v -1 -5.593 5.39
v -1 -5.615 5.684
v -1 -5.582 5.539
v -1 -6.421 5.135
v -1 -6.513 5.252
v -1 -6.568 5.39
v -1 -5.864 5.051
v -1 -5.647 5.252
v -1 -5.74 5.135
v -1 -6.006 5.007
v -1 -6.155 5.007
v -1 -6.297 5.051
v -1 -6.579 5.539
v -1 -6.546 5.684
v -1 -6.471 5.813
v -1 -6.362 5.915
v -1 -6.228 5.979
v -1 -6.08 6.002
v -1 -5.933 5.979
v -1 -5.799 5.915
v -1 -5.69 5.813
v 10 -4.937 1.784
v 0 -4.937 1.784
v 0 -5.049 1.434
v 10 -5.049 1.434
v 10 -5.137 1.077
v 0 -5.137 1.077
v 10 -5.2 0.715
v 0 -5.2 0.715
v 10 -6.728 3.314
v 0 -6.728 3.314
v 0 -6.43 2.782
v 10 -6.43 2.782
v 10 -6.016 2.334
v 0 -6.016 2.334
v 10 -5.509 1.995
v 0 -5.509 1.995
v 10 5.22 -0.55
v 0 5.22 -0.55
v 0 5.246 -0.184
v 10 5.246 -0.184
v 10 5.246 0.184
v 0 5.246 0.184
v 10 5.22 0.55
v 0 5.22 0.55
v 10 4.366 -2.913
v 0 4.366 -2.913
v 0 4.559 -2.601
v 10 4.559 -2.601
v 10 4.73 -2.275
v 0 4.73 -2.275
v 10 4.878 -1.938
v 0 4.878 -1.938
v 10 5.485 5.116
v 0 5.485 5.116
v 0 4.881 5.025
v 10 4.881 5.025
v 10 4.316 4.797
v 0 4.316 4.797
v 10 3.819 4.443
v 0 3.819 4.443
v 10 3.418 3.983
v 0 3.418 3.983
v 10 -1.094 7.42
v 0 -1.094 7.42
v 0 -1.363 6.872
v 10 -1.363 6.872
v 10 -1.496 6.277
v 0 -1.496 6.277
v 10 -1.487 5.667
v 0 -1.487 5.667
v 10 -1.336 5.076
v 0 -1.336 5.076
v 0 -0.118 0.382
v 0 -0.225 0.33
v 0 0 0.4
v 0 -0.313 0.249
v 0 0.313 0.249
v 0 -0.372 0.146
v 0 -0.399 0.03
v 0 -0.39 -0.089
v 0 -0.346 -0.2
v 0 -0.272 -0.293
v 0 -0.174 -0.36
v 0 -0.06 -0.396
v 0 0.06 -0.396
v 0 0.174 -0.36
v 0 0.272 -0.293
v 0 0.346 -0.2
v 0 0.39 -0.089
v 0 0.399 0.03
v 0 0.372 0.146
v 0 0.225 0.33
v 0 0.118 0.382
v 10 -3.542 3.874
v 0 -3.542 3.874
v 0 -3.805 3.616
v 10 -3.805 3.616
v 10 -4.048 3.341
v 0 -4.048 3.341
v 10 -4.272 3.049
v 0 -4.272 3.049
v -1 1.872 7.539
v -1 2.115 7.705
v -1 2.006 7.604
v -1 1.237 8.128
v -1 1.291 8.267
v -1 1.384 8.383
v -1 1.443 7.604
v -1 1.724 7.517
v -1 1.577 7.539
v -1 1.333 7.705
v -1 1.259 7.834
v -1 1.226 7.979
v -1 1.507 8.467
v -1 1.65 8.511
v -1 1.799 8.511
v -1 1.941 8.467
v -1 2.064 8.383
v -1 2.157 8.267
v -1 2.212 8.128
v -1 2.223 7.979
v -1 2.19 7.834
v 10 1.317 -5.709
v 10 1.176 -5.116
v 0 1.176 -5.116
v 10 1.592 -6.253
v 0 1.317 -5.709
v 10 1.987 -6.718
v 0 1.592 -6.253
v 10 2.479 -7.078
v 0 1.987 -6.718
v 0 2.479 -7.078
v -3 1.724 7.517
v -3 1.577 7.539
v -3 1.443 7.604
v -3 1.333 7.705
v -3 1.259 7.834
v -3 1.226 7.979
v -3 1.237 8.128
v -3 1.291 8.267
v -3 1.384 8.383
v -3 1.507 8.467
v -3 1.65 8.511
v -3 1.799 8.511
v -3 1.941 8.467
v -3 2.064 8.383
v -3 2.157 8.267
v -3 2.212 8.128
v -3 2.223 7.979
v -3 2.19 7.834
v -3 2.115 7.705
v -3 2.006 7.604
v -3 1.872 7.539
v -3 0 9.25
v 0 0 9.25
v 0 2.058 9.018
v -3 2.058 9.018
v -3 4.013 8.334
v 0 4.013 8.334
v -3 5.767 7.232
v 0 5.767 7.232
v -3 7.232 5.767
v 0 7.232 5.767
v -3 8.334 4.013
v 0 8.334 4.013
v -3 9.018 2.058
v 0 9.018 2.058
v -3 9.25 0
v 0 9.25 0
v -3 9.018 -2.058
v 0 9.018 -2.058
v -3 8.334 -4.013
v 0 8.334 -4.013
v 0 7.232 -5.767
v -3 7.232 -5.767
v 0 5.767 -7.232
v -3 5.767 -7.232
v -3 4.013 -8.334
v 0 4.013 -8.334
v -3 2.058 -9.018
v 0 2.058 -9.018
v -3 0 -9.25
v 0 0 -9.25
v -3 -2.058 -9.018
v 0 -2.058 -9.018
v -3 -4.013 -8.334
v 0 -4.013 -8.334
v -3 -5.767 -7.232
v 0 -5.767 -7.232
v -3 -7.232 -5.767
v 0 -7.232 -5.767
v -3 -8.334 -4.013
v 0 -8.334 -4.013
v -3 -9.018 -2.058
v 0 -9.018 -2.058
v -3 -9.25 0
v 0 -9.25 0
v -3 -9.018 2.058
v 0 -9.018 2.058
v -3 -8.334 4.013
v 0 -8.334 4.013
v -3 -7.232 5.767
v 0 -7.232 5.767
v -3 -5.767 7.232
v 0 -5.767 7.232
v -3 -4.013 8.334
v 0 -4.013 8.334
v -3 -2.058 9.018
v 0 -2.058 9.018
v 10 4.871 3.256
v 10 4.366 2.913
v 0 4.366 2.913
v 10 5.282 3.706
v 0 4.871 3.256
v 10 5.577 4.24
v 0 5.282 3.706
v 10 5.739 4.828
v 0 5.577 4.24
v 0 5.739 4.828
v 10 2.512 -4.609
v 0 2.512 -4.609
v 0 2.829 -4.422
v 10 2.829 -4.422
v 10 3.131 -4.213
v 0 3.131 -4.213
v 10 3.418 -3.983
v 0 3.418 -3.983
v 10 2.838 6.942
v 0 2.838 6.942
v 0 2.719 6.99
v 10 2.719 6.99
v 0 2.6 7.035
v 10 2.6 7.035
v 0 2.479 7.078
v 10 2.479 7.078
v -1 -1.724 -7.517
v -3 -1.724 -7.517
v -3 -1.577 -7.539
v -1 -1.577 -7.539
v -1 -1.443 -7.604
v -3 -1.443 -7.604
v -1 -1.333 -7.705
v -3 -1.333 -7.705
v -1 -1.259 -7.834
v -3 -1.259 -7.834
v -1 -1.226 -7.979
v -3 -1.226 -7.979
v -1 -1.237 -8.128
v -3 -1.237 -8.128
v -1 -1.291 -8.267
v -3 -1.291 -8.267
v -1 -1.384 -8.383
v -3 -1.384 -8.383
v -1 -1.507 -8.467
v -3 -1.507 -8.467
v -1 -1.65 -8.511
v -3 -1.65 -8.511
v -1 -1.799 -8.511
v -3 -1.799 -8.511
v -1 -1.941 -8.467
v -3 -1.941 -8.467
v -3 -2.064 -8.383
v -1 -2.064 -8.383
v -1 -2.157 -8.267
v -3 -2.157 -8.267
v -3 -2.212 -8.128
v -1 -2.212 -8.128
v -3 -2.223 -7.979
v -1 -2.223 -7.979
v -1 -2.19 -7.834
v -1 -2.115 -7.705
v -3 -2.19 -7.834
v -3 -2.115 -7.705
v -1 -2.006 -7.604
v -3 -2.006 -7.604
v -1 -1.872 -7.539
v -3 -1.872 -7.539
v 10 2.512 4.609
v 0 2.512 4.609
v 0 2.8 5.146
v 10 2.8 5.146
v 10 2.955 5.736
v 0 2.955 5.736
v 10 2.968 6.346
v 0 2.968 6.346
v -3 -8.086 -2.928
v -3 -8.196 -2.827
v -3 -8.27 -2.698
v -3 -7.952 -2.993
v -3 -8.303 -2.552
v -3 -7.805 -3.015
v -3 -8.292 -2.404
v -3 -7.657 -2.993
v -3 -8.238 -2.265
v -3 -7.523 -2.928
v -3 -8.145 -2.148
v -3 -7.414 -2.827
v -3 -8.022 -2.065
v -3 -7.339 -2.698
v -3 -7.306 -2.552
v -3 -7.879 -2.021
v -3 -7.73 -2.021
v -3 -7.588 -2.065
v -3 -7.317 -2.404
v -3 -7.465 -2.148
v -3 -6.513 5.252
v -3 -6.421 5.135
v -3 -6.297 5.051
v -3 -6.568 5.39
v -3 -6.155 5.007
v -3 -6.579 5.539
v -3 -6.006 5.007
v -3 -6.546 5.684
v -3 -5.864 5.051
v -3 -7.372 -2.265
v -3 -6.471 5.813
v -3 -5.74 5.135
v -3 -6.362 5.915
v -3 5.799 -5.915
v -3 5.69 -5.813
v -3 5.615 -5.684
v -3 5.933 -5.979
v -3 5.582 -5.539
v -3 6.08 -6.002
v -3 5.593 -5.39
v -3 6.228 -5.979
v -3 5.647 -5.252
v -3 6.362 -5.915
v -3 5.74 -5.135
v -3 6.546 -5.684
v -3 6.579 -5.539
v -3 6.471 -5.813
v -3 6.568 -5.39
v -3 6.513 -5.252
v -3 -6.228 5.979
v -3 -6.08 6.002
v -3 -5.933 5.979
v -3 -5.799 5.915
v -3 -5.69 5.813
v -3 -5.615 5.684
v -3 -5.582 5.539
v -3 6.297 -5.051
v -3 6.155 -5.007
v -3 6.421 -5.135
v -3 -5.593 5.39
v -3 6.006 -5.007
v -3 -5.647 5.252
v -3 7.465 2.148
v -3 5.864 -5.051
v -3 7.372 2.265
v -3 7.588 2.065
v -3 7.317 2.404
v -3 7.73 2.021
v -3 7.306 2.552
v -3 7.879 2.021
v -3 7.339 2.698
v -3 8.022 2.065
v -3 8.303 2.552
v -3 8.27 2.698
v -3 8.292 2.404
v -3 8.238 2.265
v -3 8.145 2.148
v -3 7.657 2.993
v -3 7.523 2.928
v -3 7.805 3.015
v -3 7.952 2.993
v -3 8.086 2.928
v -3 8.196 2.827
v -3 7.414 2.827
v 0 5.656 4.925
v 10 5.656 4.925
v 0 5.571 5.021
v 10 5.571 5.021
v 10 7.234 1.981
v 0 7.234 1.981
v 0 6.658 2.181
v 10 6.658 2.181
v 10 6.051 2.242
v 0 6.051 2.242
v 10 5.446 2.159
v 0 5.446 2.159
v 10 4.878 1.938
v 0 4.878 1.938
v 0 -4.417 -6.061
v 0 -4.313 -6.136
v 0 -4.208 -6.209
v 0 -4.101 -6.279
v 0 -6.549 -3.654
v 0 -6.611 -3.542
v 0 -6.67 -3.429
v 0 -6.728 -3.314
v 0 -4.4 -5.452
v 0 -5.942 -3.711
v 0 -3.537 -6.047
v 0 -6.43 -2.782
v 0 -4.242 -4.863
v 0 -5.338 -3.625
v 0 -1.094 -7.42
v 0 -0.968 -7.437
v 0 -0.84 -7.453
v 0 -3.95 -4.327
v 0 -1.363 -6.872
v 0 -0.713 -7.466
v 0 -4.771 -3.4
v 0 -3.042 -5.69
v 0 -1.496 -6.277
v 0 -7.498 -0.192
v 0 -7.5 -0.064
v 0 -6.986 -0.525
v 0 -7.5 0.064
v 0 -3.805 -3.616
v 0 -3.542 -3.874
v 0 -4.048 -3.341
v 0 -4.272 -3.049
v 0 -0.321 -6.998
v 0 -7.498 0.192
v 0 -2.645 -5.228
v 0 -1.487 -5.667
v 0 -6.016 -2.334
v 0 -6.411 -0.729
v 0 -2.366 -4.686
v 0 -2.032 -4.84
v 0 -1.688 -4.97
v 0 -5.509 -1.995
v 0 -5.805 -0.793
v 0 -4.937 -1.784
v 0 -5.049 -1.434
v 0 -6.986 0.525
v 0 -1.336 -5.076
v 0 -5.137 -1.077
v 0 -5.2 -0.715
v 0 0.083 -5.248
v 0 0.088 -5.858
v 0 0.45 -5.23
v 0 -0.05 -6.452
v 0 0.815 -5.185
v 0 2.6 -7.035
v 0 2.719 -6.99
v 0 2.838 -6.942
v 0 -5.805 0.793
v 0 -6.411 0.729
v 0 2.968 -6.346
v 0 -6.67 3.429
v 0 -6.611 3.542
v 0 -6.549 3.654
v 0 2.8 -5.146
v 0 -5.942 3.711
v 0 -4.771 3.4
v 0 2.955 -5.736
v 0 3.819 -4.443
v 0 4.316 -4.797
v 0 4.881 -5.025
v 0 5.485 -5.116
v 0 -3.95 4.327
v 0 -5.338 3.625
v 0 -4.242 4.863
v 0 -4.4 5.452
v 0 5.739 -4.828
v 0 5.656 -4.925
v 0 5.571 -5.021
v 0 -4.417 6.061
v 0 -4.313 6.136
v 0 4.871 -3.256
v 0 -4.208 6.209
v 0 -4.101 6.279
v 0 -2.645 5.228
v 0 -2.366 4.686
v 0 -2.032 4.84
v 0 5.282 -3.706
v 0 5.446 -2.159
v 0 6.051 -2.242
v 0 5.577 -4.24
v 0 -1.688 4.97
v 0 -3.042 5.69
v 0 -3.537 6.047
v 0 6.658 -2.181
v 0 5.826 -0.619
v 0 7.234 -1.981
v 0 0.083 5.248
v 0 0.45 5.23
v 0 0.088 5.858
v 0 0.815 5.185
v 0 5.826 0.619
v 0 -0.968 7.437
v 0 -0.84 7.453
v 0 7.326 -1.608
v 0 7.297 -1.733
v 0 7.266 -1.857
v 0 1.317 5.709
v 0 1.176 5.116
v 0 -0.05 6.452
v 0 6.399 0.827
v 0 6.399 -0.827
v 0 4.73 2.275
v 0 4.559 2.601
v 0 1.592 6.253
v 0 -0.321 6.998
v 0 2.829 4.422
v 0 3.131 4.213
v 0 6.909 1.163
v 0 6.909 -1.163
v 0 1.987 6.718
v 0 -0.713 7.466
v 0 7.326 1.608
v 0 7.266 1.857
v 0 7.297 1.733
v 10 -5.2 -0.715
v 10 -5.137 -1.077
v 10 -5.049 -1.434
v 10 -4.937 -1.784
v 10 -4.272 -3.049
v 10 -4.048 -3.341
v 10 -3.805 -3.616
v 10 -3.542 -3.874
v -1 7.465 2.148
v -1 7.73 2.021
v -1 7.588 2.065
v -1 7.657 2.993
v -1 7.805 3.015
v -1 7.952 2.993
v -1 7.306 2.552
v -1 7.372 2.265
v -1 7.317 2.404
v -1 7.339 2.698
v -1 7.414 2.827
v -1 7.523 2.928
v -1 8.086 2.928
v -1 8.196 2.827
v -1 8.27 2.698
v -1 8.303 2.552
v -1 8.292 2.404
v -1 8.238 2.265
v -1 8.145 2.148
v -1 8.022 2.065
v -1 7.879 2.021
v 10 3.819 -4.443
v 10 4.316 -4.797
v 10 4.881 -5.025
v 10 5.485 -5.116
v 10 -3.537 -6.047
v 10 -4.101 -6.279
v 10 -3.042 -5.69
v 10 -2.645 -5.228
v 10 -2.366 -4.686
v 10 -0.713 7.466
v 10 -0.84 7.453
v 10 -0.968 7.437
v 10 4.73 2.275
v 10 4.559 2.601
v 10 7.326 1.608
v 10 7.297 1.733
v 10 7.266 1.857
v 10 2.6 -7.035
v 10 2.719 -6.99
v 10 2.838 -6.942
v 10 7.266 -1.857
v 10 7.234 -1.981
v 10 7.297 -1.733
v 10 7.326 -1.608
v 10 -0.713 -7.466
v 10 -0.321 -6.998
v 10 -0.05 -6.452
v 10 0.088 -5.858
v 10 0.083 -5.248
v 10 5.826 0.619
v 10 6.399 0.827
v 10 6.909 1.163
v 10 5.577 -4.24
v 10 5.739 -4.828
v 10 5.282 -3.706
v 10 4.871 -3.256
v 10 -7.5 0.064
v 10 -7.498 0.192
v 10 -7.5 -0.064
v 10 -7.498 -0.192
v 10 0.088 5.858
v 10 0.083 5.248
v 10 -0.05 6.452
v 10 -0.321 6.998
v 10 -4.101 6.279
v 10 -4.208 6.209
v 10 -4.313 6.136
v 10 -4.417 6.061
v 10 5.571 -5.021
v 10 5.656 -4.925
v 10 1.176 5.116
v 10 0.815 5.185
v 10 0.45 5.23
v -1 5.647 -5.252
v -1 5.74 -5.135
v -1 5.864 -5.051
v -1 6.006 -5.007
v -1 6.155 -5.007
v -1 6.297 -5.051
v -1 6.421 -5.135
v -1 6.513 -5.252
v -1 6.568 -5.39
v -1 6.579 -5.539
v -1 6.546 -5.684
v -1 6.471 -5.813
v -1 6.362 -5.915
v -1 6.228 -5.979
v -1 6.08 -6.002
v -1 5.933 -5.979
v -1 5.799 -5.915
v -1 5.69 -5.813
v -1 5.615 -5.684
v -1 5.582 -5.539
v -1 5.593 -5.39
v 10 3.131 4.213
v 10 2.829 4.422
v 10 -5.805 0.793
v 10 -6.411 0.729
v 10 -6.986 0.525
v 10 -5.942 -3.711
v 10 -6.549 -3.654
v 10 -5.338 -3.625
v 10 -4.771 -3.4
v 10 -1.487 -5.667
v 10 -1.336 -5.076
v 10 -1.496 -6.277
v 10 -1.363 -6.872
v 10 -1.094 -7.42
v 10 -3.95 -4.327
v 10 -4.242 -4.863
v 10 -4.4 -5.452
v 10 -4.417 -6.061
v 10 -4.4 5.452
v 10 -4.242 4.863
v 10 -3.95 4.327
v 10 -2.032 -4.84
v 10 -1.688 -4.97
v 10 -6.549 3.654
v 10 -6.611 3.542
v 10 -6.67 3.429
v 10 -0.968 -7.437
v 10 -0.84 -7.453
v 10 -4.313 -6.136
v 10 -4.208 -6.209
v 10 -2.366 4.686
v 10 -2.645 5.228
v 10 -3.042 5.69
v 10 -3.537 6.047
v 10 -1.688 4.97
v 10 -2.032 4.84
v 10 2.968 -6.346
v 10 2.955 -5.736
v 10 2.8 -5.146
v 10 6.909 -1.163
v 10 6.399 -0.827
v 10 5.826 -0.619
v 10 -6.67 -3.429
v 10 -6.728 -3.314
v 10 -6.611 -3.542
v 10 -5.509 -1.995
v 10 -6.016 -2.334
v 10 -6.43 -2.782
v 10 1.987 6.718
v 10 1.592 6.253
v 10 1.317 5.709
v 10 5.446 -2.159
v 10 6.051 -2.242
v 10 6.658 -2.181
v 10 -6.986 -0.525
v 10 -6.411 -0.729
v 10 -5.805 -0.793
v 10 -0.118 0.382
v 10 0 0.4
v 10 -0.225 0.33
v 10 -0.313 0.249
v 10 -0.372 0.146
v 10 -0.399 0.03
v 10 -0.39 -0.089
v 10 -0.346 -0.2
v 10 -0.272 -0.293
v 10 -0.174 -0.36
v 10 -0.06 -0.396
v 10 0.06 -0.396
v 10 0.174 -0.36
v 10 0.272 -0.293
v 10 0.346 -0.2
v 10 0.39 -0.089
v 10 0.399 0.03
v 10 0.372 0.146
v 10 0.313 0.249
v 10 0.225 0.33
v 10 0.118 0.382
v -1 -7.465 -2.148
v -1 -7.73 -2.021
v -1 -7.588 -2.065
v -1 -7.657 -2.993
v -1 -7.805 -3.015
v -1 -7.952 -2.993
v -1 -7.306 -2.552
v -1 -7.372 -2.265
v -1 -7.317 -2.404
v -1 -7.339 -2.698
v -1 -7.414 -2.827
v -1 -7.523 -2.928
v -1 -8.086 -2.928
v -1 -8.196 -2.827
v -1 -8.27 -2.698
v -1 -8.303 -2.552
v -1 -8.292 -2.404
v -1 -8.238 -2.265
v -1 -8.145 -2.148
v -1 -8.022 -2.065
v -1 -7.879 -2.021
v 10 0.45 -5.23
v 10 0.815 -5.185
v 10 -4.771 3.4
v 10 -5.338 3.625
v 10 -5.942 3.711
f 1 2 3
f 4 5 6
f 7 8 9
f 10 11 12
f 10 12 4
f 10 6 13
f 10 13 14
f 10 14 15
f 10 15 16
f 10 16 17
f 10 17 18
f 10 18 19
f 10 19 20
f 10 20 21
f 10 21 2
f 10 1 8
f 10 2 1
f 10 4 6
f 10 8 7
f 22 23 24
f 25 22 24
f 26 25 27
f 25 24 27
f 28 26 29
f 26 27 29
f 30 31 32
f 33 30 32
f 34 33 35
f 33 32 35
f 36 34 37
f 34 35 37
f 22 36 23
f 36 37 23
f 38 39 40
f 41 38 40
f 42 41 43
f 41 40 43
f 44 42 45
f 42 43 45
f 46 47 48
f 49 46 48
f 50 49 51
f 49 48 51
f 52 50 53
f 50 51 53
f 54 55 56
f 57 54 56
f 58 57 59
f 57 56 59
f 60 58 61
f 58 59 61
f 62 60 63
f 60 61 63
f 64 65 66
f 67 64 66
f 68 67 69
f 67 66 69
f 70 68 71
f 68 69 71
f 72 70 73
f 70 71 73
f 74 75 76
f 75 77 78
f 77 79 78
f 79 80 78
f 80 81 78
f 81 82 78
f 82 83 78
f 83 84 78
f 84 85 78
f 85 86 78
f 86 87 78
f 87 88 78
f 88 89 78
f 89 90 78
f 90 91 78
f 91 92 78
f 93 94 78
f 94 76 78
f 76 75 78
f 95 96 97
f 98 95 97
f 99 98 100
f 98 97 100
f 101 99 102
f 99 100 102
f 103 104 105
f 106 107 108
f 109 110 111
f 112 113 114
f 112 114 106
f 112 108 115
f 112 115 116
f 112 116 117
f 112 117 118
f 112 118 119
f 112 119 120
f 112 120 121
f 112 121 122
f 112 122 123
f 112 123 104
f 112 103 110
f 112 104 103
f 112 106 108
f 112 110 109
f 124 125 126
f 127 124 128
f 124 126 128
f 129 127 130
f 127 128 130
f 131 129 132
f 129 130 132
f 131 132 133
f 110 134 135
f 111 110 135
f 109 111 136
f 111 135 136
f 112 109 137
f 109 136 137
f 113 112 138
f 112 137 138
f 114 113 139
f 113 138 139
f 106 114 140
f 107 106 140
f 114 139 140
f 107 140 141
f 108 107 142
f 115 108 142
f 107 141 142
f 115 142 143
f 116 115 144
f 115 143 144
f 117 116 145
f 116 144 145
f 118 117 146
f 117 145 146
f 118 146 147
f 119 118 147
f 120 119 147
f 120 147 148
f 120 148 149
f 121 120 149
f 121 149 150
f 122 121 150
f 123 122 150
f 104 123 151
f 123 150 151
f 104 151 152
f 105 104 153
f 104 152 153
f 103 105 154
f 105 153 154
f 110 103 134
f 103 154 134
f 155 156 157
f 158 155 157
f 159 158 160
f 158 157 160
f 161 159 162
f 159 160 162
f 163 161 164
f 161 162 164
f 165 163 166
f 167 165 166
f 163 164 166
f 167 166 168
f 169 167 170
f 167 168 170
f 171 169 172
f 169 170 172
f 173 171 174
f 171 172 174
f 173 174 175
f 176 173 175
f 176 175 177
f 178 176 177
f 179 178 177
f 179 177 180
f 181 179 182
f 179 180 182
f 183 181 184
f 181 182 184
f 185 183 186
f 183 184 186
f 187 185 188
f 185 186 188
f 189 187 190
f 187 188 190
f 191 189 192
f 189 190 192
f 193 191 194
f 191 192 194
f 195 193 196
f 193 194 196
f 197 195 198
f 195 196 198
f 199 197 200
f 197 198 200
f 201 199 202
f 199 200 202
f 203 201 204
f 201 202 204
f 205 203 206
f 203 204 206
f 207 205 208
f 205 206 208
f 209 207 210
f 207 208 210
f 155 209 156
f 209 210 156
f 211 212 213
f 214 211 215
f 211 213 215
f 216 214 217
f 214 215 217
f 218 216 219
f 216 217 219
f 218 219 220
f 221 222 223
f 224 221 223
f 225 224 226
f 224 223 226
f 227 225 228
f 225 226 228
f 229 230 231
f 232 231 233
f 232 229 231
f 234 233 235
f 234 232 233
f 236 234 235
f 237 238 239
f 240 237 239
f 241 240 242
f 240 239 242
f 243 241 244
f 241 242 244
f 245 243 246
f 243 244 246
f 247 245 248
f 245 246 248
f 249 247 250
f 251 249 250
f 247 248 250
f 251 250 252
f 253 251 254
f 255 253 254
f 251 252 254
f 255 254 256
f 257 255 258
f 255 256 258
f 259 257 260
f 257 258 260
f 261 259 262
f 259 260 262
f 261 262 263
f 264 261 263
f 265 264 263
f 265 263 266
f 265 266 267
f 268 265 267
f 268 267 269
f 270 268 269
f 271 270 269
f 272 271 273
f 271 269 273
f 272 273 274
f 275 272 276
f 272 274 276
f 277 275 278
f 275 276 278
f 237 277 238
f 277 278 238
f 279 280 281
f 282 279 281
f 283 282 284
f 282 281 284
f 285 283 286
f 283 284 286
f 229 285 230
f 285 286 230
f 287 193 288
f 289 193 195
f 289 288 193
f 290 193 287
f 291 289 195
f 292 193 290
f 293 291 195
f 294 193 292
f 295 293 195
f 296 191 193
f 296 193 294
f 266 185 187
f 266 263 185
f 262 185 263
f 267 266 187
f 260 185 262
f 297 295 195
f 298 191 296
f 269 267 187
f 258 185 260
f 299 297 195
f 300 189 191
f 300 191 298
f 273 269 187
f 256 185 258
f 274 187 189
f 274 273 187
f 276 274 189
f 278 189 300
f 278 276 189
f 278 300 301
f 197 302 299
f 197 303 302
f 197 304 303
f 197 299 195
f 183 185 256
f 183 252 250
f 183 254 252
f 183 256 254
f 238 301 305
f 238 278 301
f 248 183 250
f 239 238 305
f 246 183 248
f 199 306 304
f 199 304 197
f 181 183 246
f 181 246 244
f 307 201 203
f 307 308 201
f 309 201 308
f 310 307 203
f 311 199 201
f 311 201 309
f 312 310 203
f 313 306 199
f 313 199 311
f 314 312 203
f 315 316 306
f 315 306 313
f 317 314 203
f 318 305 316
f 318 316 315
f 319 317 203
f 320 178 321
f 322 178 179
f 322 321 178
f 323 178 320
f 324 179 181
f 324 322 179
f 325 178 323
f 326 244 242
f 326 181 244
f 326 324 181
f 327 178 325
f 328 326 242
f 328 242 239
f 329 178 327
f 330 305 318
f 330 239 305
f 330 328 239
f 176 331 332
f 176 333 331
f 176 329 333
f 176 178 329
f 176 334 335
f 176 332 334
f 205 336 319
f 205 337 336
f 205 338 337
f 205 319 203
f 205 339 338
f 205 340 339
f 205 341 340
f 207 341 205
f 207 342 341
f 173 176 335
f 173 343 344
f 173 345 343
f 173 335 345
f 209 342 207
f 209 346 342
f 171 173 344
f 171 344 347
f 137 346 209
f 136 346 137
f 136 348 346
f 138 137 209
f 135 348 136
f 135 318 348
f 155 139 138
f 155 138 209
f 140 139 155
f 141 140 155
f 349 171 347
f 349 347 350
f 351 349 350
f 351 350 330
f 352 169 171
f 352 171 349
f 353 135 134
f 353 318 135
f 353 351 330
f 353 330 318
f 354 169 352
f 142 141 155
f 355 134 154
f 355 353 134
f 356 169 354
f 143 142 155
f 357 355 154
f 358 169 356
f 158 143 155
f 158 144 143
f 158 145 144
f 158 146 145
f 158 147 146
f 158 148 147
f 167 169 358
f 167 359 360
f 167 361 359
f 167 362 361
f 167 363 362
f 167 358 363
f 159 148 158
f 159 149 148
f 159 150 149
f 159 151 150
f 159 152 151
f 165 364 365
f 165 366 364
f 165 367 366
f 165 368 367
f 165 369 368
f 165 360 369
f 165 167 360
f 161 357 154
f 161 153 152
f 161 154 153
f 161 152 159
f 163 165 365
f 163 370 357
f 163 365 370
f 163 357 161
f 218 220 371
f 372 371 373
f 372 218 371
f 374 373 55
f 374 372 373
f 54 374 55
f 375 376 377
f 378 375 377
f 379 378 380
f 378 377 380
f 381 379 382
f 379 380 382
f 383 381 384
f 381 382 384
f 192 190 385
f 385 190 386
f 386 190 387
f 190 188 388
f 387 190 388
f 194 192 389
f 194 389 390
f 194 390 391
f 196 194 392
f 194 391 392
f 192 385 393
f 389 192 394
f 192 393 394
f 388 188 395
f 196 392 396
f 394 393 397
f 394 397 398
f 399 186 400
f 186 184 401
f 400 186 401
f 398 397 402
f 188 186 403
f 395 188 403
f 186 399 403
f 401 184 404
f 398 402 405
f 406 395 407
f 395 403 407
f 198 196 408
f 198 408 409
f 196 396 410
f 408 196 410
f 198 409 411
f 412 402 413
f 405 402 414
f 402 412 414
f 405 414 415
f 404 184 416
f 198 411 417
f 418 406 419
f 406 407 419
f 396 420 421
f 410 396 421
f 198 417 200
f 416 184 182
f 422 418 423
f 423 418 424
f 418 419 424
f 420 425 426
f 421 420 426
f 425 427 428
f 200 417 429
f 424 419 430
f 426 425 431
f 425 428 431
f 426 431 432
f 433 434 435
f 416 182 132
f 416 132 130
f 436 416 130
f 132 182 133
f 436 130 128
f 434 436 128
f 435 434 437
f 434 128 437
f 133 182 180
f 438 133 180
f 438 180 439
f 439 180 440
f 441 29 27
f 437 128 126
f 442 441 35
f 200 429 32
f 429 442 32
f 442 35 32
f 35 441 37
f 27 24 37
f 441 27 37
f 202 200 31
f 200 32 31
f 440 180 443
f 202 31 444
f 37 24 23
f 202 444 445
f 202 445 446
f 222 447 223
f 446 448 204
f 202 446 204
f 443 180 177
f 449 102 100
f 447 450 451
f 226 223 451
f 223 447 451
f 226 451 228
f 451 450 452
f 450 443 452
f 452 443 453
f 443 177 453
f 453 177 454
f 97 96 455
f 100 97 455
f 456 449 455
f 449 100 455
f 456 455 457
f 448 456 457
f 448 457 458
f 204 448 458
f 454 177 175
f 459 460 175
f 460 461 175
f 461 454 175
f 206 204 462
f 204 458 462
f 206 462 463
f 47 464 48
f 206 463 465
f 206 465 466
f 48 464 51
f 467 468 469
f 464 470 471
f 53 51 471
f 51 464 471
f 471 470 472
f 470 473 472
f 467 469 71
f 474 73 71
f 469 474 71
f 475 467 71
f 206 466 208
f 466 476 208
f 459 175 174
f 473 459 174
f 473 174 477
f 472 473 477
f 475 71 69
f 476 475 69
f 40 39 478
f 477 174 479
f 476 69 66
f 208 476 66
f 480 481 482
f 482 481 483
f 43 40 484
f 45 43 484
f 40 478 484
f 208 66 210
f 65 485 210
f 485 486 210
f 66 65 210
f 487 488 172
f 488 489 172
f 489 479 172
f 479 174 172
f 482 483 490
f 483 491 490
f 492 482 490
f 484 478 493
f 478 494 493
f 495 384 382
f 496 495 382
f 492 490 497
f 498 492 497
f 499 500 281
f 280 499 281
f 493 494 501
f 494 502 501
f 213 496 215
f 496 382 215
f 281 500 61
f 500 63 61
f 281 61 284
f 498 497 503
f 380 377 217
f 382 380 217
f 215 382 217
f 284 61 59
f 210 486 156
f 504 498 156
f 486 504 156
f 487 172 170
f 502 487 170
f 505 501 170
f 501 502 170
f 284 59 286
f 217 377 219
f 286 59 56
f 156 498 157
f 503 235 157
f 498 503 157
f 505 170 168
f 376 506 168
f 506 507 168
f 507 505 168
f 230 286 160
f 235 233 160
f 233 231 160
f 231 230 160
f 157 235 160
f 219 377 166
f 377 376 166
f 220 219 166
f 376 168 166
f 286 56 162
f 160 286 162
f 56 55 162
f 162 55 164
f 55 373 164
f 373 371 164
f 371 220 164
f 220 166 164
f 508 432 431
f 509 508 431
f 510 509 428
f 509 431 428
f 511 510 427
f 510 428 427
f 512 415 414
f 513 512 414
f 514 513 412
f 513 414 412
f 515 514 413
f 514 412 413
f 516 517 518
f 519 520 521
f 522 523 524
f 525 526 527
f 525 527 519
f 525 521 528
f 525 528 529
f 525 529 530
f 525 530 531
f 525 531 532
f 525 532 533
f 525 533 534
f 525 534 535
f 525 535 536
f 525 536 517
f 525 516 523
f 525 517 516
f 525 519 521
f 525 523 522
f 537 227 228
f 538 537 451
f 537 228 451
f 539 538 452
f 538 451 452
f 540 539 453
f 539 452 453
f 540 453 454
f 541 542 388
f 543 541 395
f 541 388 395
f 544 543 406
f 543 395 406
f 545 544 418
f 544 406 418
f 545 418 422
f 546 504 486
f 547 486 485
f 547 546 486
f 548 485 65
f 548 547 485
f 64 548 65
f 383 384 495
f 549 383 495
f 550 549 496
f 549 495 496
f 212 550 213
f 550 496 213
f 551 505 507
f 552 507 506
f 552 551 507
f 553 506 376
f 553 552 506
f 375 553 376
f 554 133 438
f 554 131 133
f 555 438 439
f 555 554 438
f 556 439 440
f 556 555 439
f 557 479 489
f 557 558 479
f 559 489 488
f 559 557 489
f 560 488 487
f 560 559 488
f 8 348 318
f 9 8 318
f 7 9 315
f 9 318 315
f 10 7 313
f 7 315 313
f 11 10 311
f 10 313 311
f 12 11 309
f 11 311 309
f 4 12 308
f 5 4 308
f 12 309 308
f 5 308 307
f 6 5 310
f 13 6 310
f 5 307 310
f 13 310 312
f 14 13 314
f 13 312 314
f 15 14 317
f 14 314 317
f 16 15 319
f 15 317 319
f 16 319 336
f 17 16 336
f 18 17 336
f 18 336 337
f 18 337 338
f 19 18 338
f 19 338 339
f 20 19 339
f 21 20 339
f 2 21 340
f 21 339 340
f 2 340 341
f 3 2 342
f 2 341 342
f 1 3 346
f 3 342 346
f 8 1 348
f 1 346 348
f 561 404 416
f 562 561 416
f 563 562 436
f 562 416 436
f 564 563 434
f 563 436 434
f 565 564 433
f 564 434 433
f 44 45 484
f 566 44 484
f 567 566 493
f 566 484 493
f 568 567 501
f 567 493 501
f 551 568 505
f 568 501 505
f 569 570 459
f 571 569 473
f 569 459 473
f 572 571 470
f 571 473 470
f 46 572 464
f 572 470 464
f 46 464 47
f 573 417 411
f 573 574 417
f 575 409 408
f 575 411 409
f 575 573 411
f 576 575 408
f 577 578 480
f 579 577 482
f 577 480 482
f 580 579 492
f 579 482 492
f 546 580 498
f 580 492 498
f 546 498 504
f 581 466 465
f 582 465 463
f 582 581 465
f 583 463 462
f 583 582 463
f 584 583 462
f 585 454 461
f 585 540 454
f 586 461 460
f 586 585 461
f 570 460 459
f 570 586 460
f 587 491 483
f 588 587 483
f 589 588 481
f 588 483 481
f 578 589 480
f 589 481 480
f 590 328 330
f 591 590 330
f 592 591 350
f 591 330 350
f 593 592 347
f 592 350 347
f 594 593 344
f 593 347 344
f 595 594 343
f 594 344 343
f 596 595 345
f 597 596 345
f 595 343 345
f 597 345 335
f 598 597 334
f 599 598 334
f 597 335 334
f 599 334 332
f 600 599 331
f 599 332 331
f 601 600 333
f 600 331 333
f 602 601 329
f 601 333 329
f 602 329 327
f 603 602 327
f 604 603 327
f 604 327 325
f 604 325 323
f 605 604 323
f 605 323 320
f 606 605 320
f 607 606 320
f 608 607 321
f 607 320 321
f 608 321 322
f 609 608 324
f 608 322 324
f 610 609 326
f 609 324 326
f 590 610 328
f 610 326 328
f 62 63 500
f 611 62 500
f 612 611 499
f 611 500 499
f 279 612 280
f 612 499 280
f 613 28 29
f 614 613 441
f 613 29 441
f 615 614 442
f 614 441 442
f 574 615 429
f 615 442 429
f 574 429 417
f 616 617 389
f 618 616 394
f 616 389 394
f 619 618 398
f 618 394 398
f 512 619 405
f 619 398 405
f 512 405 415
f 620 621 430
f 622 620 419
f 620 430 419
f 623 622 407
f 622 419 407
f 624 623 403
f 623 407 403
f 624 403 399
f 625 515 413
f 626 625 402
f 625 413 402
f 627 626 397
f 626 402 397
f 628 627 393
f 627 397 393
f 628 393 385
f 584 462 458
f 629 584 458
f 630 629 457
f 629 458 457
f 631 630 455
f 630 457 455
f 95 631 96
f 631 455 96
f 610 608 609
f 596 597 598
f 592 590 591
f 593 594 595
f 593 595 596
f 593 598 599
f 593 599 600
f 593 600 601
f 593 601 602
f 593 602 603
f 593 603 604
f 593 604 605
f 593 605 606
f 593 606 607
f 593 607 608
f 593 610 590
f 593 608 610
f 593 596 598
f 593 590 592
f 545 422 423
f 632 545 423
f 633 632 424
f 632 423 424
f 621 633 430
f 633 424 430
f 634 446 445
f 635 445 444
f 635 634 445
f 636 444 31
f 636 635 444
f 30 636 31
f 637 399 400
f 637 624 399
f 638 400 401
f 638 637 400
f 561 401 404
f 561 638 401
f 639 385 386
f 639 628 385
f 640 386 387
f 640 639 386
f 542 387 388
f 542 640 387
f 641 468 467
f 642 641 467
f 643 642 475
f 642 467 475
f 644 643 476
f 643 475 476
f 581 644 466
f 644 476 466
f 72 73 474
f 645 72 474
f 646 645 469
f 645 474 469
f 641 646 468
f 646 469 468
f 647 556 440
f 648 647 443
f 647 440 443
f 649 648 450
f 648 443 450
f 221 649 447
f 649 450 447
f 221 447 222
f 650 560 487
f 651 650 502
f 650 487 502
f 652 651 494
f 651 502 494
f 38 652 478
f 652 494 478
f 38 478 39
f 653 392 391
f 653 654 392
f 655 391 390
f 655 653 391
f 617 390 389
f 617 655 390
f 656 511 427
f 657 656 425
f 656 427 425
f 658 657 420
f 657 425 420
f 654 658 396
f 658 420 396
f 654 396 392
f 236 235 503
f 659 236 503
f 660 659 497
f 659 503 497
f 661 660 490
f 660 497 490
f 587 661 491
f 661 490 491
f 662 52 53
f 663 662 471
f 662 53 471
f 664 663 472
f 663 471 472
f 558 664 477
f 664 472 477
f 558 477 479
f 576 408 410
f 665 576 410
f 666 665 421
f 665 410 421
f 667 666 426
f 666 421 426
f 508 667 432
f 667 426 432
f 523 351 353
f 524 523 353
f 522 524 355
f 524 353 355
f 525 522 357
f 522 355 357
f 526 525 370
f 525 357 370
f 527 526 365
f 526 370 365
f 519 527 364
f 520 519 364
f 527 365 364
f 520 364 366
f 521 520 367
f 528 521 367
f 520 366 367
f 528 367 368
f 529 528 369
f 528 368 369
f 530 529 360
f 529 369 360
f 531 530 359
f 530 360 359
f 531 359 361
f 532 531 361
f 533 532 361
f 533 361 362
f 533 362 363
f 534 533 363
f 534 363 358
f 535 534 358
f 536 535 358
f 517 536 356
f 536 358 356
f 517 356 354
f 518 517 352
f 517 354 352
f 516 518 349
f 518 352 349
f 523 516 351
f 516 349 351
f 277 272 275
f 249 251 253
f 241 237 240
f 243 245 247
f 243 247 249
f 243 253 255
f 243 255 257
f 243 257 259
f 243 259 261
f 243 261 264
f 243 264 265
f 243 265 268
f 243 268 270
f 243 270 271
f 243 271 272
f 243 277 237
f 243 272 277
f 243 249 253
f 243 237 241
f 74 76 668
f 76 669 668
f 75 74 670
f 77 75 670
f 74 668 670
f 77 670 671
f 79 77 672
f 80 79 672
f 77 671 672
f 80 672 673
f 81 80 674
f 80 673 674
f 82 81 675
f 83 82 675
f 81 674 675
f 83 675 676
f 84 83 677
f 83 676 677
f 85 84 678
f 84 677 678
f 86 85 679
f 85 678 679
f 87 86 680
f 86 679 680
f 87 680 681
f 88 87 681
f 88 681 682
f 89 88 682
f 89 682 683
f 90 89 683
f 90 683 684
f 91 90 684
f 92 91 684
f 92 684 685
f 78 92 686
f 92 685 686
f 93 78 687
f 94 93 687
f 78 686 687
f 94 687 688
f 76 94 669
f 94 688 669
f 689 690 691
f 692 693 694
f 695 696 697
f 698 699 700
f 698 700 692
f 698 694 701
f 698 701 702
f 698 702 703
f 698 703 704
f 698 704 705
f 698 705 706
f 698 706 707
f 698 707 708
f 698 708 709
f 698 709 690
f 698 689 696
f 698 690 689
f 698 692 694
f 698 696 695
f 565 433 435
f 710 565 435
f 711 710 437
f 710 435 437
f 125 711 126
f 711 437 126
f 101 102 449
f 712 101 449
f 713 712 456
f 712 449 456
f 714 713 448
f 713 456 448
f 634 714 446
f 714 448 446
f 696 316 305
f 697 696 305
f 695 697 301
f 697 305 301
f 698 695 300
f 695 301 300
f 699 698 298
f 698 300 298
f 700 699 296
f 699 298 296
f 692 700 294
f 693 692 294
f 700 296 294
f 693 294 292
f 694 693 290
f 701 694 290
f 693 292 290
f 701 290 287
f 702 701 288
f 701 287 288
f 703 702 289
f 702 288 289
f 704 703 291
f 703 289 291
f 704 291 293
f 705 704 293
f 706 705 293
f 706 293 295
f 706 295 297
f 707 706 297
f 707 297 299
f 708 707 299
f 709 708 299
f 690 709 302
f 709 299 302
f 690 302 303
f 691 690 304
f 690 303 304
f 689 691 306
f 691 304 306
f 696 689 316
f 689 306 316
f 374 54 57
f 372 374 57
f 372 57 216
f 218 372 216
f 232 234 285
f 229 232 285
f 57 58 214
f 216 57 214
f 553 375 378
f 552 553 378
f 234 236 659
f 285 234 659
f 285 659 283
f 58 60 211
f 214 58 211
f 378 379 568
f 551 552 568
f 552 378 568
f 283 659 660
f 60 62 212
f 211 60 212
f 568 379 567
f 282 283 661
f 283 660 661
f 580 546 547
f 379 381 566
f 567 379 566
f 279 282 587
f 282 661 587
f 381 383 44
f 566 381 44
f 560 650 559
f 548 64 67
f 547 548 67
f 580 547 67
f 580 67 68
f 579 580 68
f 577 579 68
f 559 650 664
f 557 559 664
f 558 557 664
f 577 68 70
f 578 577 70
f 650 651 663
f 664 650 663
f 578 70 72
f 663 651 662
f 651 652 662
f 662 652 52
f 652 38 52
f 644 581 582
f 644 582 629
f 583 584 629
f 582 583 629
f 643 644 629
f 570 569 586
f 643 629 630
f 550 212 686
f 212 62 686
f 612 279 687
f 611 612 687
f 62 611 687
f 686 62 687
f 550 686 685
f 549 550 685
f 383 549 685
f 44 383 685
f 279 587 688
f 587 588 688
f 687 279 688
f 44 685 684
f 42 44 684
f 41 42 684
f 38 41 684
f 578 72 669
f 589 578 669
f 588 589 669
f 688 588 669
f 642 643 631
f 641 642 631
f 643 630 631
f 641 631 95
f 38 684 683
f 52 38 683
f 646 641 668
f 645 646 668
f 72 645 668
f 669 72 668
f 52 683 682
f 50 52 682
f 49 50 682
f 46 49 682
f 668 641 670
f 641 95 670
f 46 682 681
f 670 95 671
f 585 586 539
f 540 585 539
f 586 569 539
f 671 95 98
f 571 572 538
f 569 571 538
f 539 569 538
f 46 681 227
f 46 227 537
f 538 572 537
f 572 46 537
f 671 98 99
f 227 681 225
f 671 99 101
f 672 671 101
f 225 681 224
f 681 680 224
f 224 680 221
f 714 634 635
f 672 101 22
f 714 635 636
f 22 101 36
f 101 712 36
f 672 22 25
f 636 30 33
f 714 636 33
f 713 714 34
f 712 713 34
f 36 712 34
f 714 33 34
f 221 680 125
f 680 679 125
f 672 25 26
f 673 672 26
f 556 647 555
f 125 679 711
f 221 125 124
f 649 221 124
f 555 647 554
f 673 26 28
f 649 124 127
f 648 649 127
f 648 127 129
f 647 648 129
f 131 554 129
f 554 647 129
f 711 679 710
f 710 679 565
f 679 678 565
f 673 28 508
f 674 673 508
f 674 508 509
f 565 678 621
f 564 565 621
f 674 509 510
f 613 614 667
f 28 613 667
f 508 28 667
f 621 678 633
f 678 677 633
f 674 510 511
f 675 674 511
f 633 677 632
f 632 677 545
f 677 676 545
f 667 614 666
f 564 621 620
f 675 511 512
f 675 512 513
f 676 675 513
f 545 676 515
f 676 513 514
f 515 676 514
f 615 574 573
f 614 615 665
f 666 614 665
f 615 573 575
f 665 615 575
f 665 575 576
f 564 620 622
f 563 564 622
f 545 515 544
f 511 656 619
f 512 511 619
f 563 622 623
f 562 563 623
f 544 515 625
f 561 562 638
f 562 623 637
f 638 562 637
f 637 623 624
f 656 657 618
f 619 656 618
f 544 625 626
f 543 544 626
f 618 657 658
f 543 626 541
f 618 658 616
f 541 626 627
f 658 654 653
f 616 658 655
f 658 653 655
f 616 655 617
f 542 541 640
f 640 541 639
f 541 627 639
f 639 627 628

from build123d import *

# Parameters (mm, degrees)
BASPROSKE_W         = 10
BASPROSKE_H         = 7.5
TOOTHCUT_DEPTH      = 15.577379737
TEETHCUTS_COUNT     = 13
TEETHCUTS_ANGLE     = 332.307692308
BORSKE_R            = 0.4
BORE_DEPTH          = 50.0000508
SKETCH1_R           = 9.25
BOSS_EXTRUDE1_DEPTH = 3
SKETCH6_R           = 0.5
CUT_EXTRUDE1_DEPTH  = 2
CIRPATTERN1_COUNT   = 6


with BuildPart() as part:
    # BasProSke → Base-Revolve (revolve)
    with BuildSketch(Plane(origin=(0, 0, 0), x_dir=(1, 0, 0), z_dir=(0, 1, 0)), mode=Mode.PRIVATE) as base_revolve_sk:
        with Locations((5, 3.75)):
            Rectangle(BASPROSKE_W, BASPROSKE_H)
    revolve(base_revolve_sk.sketch.rotate(Axis((-10, 0, 0), (1, 0, 0)), 180), axis=Axis((-10, 0, 0), (1, 0, 0)))

    # TooCutSke → ToothCut (cut, through all)
    with BuildSketch(Plane(origin=(0, 0, 0), x_dir=(0, 0, -1), z_dir=(1, 0, 0))):
        with BuildLine():
            ThreePointArc((0.550489643, 5.220053846), (0, 5.249), (-0.550489643, 5.220053846))
            ThreePointArc((-0.550489643, 5.220053846), (-0.834571714, 6.414617604), (-1.635166801, 7.345602405))
            ThreePointArc((-1.635166801, 7.345602405), (0, 7.5254), (1.635166801, 7.345602405))
            ThreePointArc((1.635166801, 7.345602405), (0.834571714, 6.414617604), (0.550489643, 5.220053846))
        make_face()
    toothcut = extrude(amount=TOOTHCUT_DEPTH, mode=Mode.SUBTRACT)

    # TeethCuts: ToothCut ×13 about axis
    teethcuts_axis = Axis((-10, 0, 0), (1, 0, 0))
    for i in range(1, TEETHCUTS_COUNT):
        add(toothcut.rotate(teethcuts_axis, i * TEETHCUTS_ANGLE / (TEETHCUTS_COUNT - 1)), mode=Mode.SUBTRACT)

    # BorSke → Bore (cut, symmetric)
    with BuildSketch(Plane(origin=(0, 0, 0), x_dir=(0, 0, -1), z_dir=(1, 0, 0))):
        with Locations(Location((0, 0, 0), (0, 0, 180))):
            Circle(BORSKE_R)
    extrude(amount=BORE_DEPTH, both=True, mode=Mode.SUBTRACT)

    # Sketch1 → Boss-Extrude1 (add)
    with BuildSketch(Plane.ZY):
        Circle(SKETCH1_R)
    extrude(amount=BOSS_EXTRUDE1_DEPTH)

    # Sketch6 → Cut-Extrude1 (cut)
    with BuildSketch(Plane.ZY.offset(3)):
        with Locations((-8.01665008, -1.724332186)):
            Circle(SKETCH6_R)
    cut_extrude1 = extrude(amount=-CUT_EXTRUDE1_DEPTH, mode=Mode.SUBTRACT)

    # CirPattern1: Cut-Extrude1 ×6 about axis
    cirpattern1_axis = Axis((0, 0, 0), (1, 0, 0))
    for i in range(1, CIRPATTERN1_COUNT):
        add(cut_extrude1.rotate(cirpattern1_axis, i * 360 / CIRPATTERN1_COUNT), mode=Mode.SUBTRACT)


solid = part.part
